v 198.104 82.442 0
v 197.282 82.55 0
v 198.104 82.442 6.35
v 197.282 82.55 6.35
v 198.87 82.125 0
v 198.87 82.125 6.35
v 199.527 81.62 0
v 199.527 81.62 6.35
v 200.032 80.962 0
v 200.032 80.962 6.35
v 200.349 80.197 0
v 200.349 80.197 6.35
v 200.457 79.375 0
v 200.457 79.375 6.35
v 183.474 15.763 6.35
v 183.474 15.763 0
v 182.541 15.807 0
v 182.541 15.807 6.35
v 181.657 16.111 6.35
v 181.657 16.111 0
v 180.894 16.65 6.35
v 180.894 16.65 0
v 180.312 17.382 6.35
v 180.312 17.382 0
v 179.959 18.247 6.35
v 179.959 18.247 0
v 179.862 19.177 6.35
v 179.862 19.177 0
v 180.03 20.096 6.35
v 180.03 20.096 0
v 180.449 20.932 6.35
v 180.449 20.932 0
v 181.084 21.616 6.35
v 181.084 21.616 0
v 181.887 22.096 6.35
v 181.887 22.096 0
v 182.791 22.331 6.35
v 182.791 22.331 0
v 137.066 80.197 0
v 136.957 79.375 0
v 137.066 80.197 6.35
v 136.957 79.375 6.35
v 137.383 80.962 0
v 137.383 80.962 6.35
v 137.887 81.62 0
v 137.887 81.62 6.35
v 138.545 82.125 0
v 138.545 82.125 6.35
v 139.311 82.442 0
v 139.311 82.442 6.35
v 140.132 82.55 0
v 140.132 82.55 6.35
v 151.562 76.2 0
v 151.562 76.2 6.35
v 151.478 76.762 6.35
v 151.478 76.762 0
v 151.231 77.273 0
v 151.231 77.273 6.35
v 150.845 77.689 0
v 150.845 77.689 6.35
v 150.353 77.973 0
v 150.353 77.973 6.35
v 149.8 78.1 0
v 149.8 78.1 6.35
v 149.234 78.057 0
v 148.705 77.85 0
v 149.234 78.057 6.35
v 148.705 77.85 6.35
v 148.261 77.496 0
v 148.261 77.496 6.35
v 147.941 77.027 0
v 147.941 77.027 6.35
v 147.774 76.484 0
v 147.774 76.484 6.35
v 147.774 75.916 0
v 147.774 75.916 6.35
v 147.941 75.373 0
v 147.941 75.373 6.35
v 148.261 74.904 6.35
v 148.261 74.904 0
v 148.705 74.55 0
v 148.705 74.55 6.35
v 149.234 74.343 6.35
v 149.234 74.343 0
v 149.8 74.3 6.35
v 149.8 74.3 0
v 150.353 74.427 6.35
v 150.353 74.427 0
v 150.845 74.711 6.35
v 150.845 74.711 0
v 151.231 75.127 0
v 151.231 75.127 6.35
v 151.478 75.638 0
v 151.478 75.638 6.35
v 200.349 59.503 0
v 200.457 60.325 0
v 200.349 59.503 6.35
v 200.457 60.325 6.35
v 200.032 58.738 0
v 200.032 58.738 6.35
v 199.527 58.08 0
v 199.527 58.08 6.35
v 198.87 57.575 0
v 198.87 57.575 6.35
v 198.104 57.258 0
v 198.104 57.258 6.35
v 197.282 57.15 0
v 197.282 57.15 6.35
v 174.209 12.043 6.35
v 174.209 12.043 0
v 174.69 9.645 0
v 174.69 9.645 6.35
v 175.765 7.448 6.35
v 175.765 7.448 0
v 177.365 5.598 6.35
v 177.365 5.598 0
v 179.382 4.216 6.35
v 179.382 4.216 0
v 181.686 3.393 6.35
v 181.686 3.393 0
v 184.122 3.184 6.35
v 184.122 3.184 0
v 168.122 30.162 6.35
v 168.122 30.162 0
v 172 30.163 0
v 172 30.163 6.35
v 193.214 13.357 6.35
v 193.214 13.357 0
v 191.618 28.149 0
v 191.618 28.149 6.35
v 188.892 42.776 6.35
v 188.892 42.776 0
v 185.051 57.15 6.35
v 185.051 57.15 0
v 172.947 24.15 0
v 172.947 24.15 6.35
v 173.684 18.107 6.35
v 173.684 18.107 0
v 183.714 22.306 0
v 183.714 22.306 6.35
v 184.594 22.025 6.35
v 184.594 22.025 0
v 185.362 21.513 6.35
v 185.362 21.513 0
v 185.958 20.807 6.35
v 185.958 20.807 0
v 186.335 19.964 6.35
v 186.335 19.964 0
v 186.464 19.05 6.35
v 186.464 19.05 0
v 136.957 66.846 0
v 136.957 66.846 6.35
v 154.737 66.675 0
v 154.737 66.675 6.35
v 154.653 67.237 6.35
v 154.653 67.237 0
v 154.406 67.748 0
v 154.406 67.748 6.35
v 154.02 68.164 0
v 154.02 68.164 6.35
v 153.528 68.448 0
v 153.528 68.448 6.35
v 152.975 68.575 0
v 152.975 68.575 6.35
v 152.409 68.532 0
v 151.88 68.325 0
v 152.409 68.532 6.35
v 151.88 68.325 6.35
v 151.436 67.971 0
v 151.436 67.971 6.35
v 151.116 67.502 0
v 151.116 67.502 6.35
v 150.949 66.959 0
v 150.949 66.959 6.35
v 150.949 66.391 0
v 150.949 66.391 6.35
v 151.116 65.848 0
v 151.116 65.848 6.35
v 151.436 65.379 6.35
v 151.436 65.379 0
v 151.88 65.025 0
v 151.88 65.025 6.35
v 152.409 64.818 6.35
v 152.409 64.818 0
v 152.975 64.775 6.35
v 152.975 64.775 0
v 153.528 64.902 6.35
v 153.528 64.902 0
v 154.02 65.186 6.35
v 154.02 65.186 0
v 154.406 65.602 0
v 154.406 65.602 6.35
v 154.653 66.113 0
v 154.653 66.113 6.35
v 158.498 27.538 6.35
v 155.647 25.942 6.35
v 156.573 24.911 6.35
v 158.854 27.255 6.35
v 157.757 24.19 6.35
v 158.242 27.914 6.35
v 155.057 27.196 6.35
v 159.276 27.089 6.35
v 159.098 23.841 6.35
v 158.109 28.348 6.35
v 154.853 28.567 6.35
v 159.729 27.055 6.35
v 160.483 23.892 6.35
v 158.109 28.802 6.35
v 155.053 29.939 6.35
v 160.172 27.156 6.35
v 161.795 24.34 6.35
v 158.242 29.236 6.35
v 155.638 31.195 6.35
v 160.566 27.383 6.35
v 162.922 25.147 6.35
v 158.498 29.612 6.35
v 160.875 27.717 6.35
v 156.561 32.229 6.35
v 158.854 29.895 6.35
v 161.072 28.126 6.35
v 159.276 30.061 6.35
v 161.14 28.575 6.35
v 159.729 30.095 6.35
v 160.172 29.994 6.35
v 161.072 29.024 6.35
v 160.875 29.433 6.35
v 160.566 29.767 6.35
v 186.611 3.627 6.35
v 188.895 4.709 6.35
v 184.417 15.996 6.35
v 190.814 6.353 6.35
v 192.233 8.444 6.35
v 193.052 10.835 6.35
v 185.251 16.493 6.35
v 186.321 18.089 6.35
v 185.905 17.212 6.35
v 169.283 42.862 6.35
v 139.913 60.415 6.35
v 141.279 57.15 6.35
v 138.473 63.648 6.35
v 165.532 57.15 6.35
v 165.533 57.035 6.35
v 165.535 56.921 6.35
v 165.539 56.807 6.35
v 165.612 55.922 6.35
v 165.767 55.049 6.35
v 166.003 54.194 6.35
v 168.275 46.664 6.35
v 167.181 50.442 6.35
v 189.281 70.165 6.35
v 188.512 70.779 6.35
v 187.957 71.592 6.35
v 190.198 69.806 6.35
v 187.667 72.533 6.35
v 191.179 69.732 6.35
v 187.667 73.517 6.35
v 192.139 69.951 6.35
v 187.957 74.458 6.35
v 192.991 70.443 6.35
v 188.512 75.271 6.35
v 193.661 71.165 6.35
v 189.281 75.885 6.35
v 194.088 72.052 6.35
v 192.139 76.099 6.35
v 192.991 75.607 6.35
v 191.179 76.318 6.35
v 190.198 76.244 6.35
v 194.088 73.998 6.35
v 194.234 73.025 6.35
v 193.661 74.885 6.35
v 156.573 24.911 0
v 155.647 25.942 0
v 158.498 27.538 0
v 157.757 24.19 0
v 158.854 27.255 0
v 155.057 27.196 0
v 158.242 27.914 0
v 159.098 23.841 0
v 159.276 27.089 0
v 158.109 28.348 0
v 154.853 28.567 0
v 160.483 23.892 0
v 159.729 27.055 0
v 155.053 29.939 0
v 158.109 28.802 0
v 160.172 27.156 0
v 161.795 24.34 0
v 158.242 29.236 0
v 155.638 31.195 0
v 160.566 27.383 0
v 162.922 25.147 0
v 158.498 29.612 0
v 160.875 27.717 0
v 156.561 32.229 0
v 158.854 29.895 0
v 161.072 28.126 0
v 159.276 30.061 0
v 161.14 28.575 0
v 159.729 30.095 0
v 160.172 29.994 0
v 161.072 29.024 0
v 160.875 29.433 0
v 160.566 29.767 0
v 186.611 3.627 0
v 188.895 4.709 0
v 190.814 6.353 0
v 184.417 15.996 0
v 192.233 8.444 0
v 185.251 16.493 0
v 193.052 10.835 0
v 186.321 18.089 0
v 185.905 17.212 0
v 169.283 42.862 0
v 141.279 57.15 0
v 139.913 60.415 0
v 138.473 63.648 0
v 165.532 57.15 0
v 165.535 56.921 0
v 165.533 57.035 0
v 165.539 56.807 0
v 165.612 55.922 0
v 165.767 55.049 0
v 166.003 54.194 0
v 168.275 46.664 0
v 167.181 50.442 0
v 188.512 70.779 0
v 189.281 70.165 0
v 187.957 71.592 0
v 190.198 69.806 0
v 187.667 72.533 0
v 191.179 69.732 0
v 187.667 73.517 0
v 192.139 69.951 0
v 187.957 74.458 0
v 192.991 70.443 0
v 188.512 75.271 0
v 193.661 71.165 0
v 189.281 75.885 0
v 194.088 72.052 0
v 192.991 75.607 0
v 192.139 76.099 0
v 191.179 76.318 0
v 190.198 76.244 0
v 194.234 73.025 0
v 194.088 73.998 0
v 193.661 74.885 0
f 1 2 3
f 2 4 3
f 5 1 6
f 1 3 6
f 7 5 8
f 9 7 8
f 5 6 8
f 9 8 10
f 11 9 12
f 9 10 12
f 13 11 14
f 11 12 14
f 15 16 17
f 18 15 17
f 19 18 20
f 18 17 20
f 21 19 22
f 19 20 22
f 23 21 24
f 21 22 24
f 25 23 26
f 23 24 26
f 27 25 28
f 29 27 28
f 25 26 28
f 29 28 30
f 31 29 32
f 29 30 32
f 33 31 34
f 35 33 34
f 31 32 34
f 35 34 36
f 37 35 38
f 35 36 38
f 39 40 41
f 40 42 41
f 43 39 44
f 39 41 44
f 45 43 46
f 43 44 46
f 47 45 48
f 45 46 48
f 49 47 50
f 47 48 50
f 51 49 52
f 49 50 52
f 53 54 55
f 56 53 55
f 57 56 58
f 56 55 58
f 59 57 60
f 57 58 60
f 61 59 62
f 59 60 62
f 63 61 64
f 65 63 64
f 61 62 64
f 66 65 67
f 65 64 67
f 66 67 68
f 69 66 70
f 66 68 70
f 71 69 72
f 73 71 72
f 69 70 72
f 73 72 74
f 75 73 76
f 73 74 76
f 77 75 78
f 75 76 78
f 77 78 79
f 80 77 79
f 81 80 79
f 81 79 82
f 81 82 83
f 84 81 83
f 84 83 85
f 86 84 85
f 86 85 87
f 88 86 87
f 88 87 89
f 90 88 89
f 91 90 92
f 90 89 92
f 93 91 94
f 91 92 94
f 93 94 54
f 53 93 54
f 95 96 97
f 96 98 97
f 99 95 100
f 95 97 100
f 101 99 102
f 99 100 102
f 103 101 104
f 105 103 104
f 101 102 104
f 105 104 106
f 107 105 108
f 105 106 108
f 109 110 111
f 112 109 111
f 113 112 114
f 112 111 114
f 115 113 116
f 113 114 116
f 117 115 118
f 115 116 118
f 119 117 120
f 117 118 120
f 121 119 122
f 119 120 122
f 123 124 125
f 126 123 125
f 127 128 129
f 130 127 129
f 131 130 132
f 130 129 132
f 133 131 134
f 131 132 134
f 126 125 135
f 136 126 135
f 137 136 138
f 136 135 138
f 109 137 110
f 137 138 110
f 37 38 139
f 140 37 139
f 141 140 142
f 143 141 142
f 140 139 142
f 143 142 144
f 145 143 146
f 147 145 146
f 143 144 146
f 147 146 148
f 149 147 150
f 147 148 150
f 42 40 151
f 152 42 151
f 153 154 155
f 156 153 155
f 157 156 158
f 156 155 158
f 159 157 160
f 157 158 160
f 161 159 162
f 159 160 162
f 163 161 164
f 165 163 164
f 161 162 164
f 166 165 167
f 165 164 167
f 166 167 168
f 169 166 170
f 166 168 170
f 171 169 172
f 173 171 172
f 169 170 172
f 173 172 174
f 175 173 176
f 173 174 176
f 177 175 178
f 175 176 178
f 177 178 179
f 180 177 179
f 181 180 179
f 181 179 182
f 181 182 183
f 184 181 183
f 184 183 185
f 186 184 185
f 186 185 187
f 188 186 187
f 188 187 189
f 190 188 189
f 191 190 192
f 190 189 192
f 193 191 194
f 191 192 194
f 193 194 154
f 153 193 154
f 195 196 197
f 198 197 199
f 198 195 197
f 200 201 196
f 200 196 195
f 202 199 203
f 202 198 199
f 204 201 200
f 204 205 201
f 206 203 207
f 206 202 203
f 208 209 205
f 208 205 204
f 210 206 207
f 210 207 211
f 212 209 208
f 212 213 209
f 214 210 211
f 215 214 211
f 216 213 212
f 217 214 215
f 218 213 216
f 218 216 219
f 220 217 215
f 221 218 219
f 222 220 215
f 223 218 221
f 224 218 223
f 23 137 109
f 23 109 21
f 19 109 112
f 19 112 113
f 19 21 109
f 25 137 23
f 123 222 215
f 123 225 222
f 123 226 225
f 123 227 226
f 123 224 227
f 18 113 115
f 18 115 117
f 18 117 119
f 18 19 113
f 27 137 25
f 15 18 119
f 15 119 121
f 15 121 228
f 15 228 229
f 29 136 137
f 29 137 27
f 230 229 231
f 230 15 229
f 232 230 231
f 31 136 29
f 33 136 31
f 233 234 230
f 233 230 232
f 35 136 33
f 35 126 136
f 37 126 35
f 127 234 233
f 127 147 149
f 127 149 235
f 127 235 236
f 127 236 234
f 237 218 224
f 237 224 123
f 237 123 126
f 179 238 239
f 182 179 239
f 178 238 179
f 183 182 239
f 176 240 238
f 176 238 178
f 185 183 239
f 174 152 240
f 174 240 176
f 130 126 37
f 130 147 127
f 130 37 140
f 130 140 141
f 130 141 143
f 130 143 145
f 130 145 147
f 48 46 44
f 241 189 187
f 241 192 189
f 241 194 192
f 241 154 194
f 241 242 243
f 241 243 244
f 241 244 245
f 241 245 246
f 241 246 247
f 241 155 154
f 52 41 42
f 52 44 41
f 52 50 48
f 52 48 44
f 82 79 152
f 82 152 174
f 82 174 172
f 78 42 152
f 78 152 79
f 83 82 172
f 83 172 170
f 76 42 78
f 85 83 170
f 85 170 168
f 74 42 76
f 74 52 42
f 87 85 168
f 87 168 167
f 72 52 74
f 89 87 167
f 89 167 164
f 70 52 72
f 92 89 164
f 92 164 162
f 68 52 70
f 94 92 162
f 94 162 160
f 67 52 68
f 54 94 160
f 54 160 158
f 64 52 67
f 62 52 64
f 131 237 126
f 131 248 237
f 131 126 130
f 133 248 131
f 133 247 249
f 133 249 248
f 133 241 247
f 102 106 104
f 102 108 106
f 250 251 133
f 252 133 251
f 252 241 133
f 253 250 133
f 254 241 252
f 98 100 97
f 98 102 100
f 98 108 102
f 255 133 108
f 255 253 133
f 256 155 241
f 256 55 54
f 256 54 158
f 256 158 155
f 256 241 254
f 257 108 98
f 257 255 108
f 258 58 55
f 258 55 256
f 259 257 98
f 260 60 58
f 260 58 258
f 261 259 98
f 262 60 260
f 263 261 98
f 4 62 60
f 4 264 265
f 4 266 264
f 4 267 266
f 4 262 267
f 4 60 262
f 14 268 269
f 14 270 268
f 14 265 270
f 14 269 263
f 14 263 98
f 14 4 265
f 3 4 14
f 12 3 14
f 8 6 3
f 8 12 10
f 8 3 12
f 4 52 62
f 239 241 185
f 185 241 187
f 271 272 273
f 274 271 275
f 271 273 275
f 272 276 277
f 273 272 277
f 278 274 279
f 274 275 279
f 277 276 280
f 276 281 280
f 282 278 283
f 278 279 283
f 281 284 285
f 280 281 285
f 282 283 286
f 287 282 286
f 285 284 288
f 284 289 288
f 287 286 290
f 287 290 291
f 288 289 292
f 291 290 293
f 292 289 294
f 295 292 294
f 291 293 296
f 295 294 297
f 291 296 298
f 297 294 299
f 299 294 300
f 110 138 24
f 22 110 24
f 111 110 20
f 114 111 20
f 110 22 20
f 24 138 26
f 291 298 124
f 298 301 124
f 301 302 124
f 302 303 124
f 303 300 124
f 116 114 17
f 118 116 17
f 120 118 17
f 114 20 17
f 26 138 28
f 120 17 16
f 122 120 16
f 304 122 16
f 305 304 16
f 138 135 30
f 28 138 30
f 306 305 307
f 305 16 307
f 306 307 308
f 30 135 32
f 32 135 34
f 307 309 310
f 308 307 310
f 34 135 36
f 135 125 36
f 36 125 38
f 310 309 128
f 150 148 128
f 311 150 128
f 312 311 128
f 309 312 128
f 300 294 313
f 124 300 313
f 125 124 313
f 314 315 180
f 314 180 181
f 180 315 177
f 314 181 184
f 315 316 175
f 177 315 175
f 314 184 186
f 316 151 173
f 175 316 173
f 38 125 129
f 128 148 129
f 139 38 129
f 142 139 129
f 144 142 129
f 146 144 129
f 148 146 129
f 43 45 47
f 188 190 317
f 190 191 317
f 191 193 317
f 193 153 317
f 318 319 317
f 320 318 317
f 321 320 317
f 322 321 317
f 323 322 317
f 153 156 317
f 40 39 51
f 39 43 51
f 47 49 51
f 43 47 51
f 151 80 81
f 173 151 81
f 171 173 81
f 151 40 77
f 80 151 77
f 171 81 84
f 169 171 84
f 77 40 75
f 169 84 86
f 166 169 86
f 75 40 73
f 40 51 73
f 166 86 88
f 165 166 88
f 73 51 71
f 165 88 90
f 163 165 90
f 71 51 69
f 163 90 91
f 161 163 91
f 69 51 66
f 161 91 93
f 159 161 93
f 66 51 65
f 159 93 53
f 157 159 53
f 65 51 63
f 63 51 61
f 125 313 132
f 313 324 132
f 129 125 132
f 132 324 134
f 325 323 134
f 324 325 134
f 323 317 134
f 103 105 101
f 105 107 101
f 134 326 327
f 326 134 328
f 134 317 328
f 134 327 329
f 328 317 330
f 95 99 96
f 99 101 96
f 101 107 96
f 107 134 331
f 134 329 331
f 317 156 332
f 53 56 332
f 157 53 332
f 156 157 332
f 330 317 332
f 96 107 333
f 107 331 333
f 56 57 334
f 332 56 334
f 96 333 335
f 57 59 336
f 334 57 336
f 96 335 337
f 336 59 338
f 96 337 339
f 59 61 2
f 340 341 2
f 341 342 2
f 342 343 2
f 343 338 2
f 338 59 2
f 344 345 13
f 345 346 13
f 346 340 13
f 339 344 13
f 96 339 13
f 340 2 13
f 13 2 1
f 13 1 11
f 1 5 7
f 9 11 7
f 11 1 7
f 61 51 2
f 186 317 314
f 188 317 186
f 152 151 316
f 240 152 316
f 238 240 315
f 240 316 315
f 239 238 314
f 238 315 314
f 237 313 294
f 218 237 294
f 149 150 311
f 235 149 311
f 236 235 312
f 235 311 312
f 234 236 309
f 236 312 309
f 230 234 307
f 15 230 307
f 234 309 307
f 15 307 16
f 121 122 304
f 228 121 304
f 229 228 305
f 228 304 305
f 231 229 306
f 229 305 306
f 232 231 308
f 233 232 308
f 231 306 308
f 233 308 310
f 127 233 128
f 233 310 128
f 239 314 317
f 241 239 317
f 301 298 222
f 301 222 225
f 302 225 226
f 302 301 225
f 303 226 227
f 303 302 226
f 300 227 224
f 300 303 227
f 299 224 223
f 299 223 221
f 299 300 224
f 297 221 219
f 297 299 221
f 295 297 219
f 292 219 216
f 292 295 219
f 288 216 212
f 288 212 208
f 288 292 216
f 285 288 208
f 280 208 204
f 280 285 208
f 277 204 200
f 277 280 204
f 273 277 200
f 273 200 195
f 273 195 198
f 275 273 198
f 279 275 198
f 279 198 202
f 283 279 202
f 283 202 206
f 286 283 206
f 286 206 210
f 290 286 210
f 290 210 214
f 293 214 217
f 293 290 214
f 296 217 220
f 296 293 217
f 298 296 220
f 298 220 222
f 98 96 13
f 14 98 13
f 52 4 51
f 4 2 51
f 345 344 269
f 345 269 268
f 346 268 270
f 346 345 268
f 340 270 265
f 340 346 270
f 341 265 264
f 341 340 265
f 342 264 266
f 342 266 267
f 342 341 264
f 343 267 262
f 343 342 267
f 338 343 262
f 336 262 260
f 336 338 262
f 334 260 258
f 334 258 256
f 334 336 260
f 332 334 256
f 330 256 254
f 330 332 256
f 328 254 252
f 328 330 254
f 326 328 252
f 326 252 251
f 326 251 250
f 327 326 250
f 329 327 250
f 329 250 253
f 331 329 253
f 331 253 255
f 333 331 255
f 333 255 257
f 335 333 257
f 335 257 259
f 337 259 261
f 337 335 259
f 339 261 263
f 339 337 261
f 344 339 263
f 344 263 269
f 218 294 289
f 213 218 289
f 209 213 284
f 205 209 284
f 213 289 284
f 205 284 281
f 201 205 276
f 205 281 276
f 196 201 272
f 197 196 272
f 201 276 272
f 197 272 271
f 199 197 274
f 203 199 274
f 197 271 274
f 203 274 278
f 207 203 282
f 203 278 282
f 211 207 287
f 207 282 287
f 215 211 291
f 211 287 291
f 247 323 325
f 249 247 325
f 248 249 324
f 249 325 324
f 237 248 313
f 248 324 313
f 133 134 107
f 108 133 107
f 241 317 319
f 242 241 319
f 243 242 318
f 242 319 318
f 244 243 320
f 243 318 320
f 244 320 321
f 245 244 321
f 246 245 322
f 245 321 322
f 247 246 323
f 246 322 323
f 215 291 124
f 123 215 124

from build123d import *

# Parameters (mm, degrees)
SKETCH1_R           = 3.302
BOSS_EXTRUDE1_DEPTH = 6.35
FILLET1_R           = 3.175
SKETCH2_R           = 1.905
CUT_EXTRUDE2_DEPTH  = 6.35
BOSS_EXTRUDE2_START = -6.35
SKETCH3_R           = 1.524
BOSS_EXTRUDE2_DEPTH = 6.35


with BuildPart() as part:
    # Sketch1 → Boss-Extrude1 (new body)
    # profile 1 of 8: a face of its own
    with BuildSketch(Plane.XY):
        with BuildLine():
            Line((141.278581179, 57.15), (154.893148654, 57.15))
            ThreePointArc((154.893148654, 57.15), (149.477461353, 70.103484559), (142.980794165, 82.55))
            Line((142.980794165, 82.55), (136.957419152, 82.55))
            Line((136.957419152, 82.55), (136.957419152, 66.846281418))
            ThreePointArc((136.957419152, 66.846281418), (139.202451266, 62.035776465), (141.278581179, 57.15))
        make_face()
    # profile 2 of 8: a face of its own
    with BuildSketch(Plane.XY):
        with BuildLine():
            Line((154.893148654, 57.15), (165.008388044, 57.15))
            ThreePointArc((165.008388044, 57.15), (159.949723048, 70.071226062), (153.881084364, 82.55))
            Line((153.881084364, 82.55), (142.980794165, 82.55))
            ThreePointArc((142.980794165, 82.55), (149.477461353, 70.103484559), (154.893148654, 57.15))
        make_face()
    # profile 3 of 8: a face of its own
    with BuildSketch(Plane.XY):
        with BuildLine():
            Line((165.008388044, 57.15), (165.532419152, 57.15))
            ThreePointArc((165.532419152, 57.15), (173.560812364, 66.556688744), (184.112113246, 60.106034483))
            ThreePointArc((184.112113246, 60.106034483), (180.006858286, 71.467031526), (175.201321699, 82.55))
            Line((175.201321699, 82.55), (153.881084364, 82.55))
            ThreePointArc((153.881084364, 82.55), (159.949723048, 70.071226062), (165.008388044, 57.15))
        make_face()
    # profile 4 of 8: a face of its own
    with BuildSketch(Plane.XY):
        with BuildLine():
            ThreePointArc((184.112113246, 60.106034483), (184.587488278, 58.629896777), (185.051028435, 57.15))
            Line((185.051028435, 57.15), (194.997737166, 57.15))
            Line((194.997737166, 57.15), (200.457419152, 57.15))
            Line((200.457419152, 57.15), (200.457419152, 82.55))
            Line((200.457419152, 82.55), (175.201321699, 82.55))
            ThreePointArc((175.201321699, 82.55), (180.006858286, 71.467031526), (184.112113246, 60.106034483))
        make_face()
        with Locations((190.932419152, 73.025)):
            Circle(SKETCH1_R, mode=Mode.SUBTRACT)
    # profile 5 of 8: a face of its own
    with BuildSketch(Plane.XY):
        with BuildLine():
            Line((165.532419152, 57.15), (175.057419152, 57.15))
            Line((175.057419152, 57.15), (185.051028435, 57.15))
            ThreePointArc((185.051028435, 57.15), (184.587488278, 58.629896777), (184.112113246, 60.106034483))
            ThreePointArc((184.112113246, 60.106034483), (173.560812364, 66.556688744), (165.532419152, 57.15))
        make_face()
    # profile 6 of 8: a face of its own
    with BuildSketch(Plane.XY):
        with BuildLine():
            Line((185.051028435, 57.15), (175.057419152, 57.15))
            ThreePointArc((175.057419152, 57.15), (179.769184167, 39.92822215), (182.790987009, 22.331089728))
            ThreePointArc((182.790987009, 22.331089728), (185.361789246, 21.512549972), (186.464004794, 19.05))
            ThreePointArc((186.464004794, 19.05), (185.604733587, 16.828225925), (183.474131965, 15.762785278))
            ThreePointArc((183.474131965, 15.762785278), (183.905882161, 9.478871593), (184.122474139, 3.183868229))
            ThreePointArc((184.122474139, 3.183868229), (190.813712192, 6.352963326), (193.213868393, 13.356896552))
            ThreePointArc((193.213868393, 13.356896552), (190.395751057, 35.488922277), (185.051028435, 57.15))
        make_face()
    # profile 7 of 8: a face of its own
    with BuildSketch(Plane.XY):
        with BuildLine():
            ThreePointArc((182.790987009, 22.331089728), (179.769184167, 39.92822215), (175.057419152, 57.15))
            Line((175.057419152, 57.15), (165.538614463, 56.806514484))
            ThreePointArc((165.538614463, 56.806514484), (165.679249432, 55.483999485), (166.002725058, 54.193965517))
            ThreePointArc((166.002725058, 54.193965517), (171.406582826, 33.37175436), (174.209225601, 12.043103448))
            ThreePointArc((174.209225601, 12.043103448), (177.364510323, 5.597834805), (184.122474139, 3.183868229))
            ThreePointArc((184.122474139, 3.183868229), (183.905882161, 9.478871593), (183.474131965, 15.762785278))
            ThreePointArc((183.474131965, 15.762785278), (179.87772057, 18.708413793), (182.790987009, 22.331089728))
        make_face()
    # profile 8 of 8: a face of its own
    with BuildSketch(Plane.XY):
        with BuildLine():
            Line((165.538614463, 56.806514484), (175.057419152, 57.15))
            Line((175.057419152, 57.15), (165.532419152, 57.15))
            ThreePointArc((165.532419152, 57.15), (165.533968105, 56.978229309), (165.538614463, 56.806514484))
        make_face()
    extrude(amount=BOSS_EXTRUDE1_DEPTH)

    # Fillet1
    fillet1_edges = [part.edges().sort_by_distance(p)[0] for p in [
        (136.957419152, 82.55, 3.175),
        (200.457419152, 82.55, 3.175),
        (200.457419152, 57.15, 3.175),
    ]]
    fillet(fillet1_edges, radius=FILLET1_R)

    # Sketch2 → Cut-Extrude2 (cut)
    with BuildSketch(Plane.XY.offset(6.35)):
        with Locations((149.657419152, 76.2)):
            Circle(SKETCH2_R)
        with Locations((152.832419152, 66.675)):
            Circle(SKETCH2_R)
    extrude(amount=-CUT_EXTRUDE2_DEPTH, mode=Mode.SUBTRACT)

    # Sketch3 → Boss-Extrude2 (add)
    with BuildSketch(Plane.XY.offset(6.35).offset(BOSS_EXTRUDE2_START)):
        with BuildLine():
            ThreePointArc((172.000332031, 30.1625), (170.759719622, 36.537771957), (169.282889622, 42.8625))
            Line((169.282889622, 42.8625), (156.561270912, 32.229125785))
            ThreePointArc((156.561270912, 32.229125785), (156.072362343, 25.392696876), (162.921852432, 25.147182454))
            Line((162.921852432, 25.147182454), (168.121534475, 30.1625))
            Line((168.121534475, 30.1625), (172.000332031, 30.1625))
        make_face()
        with Locations((159.615574597, 28.575)):
            Circle(SKETCH3_R, mode=Mode.SUBTRACT)
    extrude(amount=BOSS_EXTRUDE2_DEPTH)


solid = part.part
